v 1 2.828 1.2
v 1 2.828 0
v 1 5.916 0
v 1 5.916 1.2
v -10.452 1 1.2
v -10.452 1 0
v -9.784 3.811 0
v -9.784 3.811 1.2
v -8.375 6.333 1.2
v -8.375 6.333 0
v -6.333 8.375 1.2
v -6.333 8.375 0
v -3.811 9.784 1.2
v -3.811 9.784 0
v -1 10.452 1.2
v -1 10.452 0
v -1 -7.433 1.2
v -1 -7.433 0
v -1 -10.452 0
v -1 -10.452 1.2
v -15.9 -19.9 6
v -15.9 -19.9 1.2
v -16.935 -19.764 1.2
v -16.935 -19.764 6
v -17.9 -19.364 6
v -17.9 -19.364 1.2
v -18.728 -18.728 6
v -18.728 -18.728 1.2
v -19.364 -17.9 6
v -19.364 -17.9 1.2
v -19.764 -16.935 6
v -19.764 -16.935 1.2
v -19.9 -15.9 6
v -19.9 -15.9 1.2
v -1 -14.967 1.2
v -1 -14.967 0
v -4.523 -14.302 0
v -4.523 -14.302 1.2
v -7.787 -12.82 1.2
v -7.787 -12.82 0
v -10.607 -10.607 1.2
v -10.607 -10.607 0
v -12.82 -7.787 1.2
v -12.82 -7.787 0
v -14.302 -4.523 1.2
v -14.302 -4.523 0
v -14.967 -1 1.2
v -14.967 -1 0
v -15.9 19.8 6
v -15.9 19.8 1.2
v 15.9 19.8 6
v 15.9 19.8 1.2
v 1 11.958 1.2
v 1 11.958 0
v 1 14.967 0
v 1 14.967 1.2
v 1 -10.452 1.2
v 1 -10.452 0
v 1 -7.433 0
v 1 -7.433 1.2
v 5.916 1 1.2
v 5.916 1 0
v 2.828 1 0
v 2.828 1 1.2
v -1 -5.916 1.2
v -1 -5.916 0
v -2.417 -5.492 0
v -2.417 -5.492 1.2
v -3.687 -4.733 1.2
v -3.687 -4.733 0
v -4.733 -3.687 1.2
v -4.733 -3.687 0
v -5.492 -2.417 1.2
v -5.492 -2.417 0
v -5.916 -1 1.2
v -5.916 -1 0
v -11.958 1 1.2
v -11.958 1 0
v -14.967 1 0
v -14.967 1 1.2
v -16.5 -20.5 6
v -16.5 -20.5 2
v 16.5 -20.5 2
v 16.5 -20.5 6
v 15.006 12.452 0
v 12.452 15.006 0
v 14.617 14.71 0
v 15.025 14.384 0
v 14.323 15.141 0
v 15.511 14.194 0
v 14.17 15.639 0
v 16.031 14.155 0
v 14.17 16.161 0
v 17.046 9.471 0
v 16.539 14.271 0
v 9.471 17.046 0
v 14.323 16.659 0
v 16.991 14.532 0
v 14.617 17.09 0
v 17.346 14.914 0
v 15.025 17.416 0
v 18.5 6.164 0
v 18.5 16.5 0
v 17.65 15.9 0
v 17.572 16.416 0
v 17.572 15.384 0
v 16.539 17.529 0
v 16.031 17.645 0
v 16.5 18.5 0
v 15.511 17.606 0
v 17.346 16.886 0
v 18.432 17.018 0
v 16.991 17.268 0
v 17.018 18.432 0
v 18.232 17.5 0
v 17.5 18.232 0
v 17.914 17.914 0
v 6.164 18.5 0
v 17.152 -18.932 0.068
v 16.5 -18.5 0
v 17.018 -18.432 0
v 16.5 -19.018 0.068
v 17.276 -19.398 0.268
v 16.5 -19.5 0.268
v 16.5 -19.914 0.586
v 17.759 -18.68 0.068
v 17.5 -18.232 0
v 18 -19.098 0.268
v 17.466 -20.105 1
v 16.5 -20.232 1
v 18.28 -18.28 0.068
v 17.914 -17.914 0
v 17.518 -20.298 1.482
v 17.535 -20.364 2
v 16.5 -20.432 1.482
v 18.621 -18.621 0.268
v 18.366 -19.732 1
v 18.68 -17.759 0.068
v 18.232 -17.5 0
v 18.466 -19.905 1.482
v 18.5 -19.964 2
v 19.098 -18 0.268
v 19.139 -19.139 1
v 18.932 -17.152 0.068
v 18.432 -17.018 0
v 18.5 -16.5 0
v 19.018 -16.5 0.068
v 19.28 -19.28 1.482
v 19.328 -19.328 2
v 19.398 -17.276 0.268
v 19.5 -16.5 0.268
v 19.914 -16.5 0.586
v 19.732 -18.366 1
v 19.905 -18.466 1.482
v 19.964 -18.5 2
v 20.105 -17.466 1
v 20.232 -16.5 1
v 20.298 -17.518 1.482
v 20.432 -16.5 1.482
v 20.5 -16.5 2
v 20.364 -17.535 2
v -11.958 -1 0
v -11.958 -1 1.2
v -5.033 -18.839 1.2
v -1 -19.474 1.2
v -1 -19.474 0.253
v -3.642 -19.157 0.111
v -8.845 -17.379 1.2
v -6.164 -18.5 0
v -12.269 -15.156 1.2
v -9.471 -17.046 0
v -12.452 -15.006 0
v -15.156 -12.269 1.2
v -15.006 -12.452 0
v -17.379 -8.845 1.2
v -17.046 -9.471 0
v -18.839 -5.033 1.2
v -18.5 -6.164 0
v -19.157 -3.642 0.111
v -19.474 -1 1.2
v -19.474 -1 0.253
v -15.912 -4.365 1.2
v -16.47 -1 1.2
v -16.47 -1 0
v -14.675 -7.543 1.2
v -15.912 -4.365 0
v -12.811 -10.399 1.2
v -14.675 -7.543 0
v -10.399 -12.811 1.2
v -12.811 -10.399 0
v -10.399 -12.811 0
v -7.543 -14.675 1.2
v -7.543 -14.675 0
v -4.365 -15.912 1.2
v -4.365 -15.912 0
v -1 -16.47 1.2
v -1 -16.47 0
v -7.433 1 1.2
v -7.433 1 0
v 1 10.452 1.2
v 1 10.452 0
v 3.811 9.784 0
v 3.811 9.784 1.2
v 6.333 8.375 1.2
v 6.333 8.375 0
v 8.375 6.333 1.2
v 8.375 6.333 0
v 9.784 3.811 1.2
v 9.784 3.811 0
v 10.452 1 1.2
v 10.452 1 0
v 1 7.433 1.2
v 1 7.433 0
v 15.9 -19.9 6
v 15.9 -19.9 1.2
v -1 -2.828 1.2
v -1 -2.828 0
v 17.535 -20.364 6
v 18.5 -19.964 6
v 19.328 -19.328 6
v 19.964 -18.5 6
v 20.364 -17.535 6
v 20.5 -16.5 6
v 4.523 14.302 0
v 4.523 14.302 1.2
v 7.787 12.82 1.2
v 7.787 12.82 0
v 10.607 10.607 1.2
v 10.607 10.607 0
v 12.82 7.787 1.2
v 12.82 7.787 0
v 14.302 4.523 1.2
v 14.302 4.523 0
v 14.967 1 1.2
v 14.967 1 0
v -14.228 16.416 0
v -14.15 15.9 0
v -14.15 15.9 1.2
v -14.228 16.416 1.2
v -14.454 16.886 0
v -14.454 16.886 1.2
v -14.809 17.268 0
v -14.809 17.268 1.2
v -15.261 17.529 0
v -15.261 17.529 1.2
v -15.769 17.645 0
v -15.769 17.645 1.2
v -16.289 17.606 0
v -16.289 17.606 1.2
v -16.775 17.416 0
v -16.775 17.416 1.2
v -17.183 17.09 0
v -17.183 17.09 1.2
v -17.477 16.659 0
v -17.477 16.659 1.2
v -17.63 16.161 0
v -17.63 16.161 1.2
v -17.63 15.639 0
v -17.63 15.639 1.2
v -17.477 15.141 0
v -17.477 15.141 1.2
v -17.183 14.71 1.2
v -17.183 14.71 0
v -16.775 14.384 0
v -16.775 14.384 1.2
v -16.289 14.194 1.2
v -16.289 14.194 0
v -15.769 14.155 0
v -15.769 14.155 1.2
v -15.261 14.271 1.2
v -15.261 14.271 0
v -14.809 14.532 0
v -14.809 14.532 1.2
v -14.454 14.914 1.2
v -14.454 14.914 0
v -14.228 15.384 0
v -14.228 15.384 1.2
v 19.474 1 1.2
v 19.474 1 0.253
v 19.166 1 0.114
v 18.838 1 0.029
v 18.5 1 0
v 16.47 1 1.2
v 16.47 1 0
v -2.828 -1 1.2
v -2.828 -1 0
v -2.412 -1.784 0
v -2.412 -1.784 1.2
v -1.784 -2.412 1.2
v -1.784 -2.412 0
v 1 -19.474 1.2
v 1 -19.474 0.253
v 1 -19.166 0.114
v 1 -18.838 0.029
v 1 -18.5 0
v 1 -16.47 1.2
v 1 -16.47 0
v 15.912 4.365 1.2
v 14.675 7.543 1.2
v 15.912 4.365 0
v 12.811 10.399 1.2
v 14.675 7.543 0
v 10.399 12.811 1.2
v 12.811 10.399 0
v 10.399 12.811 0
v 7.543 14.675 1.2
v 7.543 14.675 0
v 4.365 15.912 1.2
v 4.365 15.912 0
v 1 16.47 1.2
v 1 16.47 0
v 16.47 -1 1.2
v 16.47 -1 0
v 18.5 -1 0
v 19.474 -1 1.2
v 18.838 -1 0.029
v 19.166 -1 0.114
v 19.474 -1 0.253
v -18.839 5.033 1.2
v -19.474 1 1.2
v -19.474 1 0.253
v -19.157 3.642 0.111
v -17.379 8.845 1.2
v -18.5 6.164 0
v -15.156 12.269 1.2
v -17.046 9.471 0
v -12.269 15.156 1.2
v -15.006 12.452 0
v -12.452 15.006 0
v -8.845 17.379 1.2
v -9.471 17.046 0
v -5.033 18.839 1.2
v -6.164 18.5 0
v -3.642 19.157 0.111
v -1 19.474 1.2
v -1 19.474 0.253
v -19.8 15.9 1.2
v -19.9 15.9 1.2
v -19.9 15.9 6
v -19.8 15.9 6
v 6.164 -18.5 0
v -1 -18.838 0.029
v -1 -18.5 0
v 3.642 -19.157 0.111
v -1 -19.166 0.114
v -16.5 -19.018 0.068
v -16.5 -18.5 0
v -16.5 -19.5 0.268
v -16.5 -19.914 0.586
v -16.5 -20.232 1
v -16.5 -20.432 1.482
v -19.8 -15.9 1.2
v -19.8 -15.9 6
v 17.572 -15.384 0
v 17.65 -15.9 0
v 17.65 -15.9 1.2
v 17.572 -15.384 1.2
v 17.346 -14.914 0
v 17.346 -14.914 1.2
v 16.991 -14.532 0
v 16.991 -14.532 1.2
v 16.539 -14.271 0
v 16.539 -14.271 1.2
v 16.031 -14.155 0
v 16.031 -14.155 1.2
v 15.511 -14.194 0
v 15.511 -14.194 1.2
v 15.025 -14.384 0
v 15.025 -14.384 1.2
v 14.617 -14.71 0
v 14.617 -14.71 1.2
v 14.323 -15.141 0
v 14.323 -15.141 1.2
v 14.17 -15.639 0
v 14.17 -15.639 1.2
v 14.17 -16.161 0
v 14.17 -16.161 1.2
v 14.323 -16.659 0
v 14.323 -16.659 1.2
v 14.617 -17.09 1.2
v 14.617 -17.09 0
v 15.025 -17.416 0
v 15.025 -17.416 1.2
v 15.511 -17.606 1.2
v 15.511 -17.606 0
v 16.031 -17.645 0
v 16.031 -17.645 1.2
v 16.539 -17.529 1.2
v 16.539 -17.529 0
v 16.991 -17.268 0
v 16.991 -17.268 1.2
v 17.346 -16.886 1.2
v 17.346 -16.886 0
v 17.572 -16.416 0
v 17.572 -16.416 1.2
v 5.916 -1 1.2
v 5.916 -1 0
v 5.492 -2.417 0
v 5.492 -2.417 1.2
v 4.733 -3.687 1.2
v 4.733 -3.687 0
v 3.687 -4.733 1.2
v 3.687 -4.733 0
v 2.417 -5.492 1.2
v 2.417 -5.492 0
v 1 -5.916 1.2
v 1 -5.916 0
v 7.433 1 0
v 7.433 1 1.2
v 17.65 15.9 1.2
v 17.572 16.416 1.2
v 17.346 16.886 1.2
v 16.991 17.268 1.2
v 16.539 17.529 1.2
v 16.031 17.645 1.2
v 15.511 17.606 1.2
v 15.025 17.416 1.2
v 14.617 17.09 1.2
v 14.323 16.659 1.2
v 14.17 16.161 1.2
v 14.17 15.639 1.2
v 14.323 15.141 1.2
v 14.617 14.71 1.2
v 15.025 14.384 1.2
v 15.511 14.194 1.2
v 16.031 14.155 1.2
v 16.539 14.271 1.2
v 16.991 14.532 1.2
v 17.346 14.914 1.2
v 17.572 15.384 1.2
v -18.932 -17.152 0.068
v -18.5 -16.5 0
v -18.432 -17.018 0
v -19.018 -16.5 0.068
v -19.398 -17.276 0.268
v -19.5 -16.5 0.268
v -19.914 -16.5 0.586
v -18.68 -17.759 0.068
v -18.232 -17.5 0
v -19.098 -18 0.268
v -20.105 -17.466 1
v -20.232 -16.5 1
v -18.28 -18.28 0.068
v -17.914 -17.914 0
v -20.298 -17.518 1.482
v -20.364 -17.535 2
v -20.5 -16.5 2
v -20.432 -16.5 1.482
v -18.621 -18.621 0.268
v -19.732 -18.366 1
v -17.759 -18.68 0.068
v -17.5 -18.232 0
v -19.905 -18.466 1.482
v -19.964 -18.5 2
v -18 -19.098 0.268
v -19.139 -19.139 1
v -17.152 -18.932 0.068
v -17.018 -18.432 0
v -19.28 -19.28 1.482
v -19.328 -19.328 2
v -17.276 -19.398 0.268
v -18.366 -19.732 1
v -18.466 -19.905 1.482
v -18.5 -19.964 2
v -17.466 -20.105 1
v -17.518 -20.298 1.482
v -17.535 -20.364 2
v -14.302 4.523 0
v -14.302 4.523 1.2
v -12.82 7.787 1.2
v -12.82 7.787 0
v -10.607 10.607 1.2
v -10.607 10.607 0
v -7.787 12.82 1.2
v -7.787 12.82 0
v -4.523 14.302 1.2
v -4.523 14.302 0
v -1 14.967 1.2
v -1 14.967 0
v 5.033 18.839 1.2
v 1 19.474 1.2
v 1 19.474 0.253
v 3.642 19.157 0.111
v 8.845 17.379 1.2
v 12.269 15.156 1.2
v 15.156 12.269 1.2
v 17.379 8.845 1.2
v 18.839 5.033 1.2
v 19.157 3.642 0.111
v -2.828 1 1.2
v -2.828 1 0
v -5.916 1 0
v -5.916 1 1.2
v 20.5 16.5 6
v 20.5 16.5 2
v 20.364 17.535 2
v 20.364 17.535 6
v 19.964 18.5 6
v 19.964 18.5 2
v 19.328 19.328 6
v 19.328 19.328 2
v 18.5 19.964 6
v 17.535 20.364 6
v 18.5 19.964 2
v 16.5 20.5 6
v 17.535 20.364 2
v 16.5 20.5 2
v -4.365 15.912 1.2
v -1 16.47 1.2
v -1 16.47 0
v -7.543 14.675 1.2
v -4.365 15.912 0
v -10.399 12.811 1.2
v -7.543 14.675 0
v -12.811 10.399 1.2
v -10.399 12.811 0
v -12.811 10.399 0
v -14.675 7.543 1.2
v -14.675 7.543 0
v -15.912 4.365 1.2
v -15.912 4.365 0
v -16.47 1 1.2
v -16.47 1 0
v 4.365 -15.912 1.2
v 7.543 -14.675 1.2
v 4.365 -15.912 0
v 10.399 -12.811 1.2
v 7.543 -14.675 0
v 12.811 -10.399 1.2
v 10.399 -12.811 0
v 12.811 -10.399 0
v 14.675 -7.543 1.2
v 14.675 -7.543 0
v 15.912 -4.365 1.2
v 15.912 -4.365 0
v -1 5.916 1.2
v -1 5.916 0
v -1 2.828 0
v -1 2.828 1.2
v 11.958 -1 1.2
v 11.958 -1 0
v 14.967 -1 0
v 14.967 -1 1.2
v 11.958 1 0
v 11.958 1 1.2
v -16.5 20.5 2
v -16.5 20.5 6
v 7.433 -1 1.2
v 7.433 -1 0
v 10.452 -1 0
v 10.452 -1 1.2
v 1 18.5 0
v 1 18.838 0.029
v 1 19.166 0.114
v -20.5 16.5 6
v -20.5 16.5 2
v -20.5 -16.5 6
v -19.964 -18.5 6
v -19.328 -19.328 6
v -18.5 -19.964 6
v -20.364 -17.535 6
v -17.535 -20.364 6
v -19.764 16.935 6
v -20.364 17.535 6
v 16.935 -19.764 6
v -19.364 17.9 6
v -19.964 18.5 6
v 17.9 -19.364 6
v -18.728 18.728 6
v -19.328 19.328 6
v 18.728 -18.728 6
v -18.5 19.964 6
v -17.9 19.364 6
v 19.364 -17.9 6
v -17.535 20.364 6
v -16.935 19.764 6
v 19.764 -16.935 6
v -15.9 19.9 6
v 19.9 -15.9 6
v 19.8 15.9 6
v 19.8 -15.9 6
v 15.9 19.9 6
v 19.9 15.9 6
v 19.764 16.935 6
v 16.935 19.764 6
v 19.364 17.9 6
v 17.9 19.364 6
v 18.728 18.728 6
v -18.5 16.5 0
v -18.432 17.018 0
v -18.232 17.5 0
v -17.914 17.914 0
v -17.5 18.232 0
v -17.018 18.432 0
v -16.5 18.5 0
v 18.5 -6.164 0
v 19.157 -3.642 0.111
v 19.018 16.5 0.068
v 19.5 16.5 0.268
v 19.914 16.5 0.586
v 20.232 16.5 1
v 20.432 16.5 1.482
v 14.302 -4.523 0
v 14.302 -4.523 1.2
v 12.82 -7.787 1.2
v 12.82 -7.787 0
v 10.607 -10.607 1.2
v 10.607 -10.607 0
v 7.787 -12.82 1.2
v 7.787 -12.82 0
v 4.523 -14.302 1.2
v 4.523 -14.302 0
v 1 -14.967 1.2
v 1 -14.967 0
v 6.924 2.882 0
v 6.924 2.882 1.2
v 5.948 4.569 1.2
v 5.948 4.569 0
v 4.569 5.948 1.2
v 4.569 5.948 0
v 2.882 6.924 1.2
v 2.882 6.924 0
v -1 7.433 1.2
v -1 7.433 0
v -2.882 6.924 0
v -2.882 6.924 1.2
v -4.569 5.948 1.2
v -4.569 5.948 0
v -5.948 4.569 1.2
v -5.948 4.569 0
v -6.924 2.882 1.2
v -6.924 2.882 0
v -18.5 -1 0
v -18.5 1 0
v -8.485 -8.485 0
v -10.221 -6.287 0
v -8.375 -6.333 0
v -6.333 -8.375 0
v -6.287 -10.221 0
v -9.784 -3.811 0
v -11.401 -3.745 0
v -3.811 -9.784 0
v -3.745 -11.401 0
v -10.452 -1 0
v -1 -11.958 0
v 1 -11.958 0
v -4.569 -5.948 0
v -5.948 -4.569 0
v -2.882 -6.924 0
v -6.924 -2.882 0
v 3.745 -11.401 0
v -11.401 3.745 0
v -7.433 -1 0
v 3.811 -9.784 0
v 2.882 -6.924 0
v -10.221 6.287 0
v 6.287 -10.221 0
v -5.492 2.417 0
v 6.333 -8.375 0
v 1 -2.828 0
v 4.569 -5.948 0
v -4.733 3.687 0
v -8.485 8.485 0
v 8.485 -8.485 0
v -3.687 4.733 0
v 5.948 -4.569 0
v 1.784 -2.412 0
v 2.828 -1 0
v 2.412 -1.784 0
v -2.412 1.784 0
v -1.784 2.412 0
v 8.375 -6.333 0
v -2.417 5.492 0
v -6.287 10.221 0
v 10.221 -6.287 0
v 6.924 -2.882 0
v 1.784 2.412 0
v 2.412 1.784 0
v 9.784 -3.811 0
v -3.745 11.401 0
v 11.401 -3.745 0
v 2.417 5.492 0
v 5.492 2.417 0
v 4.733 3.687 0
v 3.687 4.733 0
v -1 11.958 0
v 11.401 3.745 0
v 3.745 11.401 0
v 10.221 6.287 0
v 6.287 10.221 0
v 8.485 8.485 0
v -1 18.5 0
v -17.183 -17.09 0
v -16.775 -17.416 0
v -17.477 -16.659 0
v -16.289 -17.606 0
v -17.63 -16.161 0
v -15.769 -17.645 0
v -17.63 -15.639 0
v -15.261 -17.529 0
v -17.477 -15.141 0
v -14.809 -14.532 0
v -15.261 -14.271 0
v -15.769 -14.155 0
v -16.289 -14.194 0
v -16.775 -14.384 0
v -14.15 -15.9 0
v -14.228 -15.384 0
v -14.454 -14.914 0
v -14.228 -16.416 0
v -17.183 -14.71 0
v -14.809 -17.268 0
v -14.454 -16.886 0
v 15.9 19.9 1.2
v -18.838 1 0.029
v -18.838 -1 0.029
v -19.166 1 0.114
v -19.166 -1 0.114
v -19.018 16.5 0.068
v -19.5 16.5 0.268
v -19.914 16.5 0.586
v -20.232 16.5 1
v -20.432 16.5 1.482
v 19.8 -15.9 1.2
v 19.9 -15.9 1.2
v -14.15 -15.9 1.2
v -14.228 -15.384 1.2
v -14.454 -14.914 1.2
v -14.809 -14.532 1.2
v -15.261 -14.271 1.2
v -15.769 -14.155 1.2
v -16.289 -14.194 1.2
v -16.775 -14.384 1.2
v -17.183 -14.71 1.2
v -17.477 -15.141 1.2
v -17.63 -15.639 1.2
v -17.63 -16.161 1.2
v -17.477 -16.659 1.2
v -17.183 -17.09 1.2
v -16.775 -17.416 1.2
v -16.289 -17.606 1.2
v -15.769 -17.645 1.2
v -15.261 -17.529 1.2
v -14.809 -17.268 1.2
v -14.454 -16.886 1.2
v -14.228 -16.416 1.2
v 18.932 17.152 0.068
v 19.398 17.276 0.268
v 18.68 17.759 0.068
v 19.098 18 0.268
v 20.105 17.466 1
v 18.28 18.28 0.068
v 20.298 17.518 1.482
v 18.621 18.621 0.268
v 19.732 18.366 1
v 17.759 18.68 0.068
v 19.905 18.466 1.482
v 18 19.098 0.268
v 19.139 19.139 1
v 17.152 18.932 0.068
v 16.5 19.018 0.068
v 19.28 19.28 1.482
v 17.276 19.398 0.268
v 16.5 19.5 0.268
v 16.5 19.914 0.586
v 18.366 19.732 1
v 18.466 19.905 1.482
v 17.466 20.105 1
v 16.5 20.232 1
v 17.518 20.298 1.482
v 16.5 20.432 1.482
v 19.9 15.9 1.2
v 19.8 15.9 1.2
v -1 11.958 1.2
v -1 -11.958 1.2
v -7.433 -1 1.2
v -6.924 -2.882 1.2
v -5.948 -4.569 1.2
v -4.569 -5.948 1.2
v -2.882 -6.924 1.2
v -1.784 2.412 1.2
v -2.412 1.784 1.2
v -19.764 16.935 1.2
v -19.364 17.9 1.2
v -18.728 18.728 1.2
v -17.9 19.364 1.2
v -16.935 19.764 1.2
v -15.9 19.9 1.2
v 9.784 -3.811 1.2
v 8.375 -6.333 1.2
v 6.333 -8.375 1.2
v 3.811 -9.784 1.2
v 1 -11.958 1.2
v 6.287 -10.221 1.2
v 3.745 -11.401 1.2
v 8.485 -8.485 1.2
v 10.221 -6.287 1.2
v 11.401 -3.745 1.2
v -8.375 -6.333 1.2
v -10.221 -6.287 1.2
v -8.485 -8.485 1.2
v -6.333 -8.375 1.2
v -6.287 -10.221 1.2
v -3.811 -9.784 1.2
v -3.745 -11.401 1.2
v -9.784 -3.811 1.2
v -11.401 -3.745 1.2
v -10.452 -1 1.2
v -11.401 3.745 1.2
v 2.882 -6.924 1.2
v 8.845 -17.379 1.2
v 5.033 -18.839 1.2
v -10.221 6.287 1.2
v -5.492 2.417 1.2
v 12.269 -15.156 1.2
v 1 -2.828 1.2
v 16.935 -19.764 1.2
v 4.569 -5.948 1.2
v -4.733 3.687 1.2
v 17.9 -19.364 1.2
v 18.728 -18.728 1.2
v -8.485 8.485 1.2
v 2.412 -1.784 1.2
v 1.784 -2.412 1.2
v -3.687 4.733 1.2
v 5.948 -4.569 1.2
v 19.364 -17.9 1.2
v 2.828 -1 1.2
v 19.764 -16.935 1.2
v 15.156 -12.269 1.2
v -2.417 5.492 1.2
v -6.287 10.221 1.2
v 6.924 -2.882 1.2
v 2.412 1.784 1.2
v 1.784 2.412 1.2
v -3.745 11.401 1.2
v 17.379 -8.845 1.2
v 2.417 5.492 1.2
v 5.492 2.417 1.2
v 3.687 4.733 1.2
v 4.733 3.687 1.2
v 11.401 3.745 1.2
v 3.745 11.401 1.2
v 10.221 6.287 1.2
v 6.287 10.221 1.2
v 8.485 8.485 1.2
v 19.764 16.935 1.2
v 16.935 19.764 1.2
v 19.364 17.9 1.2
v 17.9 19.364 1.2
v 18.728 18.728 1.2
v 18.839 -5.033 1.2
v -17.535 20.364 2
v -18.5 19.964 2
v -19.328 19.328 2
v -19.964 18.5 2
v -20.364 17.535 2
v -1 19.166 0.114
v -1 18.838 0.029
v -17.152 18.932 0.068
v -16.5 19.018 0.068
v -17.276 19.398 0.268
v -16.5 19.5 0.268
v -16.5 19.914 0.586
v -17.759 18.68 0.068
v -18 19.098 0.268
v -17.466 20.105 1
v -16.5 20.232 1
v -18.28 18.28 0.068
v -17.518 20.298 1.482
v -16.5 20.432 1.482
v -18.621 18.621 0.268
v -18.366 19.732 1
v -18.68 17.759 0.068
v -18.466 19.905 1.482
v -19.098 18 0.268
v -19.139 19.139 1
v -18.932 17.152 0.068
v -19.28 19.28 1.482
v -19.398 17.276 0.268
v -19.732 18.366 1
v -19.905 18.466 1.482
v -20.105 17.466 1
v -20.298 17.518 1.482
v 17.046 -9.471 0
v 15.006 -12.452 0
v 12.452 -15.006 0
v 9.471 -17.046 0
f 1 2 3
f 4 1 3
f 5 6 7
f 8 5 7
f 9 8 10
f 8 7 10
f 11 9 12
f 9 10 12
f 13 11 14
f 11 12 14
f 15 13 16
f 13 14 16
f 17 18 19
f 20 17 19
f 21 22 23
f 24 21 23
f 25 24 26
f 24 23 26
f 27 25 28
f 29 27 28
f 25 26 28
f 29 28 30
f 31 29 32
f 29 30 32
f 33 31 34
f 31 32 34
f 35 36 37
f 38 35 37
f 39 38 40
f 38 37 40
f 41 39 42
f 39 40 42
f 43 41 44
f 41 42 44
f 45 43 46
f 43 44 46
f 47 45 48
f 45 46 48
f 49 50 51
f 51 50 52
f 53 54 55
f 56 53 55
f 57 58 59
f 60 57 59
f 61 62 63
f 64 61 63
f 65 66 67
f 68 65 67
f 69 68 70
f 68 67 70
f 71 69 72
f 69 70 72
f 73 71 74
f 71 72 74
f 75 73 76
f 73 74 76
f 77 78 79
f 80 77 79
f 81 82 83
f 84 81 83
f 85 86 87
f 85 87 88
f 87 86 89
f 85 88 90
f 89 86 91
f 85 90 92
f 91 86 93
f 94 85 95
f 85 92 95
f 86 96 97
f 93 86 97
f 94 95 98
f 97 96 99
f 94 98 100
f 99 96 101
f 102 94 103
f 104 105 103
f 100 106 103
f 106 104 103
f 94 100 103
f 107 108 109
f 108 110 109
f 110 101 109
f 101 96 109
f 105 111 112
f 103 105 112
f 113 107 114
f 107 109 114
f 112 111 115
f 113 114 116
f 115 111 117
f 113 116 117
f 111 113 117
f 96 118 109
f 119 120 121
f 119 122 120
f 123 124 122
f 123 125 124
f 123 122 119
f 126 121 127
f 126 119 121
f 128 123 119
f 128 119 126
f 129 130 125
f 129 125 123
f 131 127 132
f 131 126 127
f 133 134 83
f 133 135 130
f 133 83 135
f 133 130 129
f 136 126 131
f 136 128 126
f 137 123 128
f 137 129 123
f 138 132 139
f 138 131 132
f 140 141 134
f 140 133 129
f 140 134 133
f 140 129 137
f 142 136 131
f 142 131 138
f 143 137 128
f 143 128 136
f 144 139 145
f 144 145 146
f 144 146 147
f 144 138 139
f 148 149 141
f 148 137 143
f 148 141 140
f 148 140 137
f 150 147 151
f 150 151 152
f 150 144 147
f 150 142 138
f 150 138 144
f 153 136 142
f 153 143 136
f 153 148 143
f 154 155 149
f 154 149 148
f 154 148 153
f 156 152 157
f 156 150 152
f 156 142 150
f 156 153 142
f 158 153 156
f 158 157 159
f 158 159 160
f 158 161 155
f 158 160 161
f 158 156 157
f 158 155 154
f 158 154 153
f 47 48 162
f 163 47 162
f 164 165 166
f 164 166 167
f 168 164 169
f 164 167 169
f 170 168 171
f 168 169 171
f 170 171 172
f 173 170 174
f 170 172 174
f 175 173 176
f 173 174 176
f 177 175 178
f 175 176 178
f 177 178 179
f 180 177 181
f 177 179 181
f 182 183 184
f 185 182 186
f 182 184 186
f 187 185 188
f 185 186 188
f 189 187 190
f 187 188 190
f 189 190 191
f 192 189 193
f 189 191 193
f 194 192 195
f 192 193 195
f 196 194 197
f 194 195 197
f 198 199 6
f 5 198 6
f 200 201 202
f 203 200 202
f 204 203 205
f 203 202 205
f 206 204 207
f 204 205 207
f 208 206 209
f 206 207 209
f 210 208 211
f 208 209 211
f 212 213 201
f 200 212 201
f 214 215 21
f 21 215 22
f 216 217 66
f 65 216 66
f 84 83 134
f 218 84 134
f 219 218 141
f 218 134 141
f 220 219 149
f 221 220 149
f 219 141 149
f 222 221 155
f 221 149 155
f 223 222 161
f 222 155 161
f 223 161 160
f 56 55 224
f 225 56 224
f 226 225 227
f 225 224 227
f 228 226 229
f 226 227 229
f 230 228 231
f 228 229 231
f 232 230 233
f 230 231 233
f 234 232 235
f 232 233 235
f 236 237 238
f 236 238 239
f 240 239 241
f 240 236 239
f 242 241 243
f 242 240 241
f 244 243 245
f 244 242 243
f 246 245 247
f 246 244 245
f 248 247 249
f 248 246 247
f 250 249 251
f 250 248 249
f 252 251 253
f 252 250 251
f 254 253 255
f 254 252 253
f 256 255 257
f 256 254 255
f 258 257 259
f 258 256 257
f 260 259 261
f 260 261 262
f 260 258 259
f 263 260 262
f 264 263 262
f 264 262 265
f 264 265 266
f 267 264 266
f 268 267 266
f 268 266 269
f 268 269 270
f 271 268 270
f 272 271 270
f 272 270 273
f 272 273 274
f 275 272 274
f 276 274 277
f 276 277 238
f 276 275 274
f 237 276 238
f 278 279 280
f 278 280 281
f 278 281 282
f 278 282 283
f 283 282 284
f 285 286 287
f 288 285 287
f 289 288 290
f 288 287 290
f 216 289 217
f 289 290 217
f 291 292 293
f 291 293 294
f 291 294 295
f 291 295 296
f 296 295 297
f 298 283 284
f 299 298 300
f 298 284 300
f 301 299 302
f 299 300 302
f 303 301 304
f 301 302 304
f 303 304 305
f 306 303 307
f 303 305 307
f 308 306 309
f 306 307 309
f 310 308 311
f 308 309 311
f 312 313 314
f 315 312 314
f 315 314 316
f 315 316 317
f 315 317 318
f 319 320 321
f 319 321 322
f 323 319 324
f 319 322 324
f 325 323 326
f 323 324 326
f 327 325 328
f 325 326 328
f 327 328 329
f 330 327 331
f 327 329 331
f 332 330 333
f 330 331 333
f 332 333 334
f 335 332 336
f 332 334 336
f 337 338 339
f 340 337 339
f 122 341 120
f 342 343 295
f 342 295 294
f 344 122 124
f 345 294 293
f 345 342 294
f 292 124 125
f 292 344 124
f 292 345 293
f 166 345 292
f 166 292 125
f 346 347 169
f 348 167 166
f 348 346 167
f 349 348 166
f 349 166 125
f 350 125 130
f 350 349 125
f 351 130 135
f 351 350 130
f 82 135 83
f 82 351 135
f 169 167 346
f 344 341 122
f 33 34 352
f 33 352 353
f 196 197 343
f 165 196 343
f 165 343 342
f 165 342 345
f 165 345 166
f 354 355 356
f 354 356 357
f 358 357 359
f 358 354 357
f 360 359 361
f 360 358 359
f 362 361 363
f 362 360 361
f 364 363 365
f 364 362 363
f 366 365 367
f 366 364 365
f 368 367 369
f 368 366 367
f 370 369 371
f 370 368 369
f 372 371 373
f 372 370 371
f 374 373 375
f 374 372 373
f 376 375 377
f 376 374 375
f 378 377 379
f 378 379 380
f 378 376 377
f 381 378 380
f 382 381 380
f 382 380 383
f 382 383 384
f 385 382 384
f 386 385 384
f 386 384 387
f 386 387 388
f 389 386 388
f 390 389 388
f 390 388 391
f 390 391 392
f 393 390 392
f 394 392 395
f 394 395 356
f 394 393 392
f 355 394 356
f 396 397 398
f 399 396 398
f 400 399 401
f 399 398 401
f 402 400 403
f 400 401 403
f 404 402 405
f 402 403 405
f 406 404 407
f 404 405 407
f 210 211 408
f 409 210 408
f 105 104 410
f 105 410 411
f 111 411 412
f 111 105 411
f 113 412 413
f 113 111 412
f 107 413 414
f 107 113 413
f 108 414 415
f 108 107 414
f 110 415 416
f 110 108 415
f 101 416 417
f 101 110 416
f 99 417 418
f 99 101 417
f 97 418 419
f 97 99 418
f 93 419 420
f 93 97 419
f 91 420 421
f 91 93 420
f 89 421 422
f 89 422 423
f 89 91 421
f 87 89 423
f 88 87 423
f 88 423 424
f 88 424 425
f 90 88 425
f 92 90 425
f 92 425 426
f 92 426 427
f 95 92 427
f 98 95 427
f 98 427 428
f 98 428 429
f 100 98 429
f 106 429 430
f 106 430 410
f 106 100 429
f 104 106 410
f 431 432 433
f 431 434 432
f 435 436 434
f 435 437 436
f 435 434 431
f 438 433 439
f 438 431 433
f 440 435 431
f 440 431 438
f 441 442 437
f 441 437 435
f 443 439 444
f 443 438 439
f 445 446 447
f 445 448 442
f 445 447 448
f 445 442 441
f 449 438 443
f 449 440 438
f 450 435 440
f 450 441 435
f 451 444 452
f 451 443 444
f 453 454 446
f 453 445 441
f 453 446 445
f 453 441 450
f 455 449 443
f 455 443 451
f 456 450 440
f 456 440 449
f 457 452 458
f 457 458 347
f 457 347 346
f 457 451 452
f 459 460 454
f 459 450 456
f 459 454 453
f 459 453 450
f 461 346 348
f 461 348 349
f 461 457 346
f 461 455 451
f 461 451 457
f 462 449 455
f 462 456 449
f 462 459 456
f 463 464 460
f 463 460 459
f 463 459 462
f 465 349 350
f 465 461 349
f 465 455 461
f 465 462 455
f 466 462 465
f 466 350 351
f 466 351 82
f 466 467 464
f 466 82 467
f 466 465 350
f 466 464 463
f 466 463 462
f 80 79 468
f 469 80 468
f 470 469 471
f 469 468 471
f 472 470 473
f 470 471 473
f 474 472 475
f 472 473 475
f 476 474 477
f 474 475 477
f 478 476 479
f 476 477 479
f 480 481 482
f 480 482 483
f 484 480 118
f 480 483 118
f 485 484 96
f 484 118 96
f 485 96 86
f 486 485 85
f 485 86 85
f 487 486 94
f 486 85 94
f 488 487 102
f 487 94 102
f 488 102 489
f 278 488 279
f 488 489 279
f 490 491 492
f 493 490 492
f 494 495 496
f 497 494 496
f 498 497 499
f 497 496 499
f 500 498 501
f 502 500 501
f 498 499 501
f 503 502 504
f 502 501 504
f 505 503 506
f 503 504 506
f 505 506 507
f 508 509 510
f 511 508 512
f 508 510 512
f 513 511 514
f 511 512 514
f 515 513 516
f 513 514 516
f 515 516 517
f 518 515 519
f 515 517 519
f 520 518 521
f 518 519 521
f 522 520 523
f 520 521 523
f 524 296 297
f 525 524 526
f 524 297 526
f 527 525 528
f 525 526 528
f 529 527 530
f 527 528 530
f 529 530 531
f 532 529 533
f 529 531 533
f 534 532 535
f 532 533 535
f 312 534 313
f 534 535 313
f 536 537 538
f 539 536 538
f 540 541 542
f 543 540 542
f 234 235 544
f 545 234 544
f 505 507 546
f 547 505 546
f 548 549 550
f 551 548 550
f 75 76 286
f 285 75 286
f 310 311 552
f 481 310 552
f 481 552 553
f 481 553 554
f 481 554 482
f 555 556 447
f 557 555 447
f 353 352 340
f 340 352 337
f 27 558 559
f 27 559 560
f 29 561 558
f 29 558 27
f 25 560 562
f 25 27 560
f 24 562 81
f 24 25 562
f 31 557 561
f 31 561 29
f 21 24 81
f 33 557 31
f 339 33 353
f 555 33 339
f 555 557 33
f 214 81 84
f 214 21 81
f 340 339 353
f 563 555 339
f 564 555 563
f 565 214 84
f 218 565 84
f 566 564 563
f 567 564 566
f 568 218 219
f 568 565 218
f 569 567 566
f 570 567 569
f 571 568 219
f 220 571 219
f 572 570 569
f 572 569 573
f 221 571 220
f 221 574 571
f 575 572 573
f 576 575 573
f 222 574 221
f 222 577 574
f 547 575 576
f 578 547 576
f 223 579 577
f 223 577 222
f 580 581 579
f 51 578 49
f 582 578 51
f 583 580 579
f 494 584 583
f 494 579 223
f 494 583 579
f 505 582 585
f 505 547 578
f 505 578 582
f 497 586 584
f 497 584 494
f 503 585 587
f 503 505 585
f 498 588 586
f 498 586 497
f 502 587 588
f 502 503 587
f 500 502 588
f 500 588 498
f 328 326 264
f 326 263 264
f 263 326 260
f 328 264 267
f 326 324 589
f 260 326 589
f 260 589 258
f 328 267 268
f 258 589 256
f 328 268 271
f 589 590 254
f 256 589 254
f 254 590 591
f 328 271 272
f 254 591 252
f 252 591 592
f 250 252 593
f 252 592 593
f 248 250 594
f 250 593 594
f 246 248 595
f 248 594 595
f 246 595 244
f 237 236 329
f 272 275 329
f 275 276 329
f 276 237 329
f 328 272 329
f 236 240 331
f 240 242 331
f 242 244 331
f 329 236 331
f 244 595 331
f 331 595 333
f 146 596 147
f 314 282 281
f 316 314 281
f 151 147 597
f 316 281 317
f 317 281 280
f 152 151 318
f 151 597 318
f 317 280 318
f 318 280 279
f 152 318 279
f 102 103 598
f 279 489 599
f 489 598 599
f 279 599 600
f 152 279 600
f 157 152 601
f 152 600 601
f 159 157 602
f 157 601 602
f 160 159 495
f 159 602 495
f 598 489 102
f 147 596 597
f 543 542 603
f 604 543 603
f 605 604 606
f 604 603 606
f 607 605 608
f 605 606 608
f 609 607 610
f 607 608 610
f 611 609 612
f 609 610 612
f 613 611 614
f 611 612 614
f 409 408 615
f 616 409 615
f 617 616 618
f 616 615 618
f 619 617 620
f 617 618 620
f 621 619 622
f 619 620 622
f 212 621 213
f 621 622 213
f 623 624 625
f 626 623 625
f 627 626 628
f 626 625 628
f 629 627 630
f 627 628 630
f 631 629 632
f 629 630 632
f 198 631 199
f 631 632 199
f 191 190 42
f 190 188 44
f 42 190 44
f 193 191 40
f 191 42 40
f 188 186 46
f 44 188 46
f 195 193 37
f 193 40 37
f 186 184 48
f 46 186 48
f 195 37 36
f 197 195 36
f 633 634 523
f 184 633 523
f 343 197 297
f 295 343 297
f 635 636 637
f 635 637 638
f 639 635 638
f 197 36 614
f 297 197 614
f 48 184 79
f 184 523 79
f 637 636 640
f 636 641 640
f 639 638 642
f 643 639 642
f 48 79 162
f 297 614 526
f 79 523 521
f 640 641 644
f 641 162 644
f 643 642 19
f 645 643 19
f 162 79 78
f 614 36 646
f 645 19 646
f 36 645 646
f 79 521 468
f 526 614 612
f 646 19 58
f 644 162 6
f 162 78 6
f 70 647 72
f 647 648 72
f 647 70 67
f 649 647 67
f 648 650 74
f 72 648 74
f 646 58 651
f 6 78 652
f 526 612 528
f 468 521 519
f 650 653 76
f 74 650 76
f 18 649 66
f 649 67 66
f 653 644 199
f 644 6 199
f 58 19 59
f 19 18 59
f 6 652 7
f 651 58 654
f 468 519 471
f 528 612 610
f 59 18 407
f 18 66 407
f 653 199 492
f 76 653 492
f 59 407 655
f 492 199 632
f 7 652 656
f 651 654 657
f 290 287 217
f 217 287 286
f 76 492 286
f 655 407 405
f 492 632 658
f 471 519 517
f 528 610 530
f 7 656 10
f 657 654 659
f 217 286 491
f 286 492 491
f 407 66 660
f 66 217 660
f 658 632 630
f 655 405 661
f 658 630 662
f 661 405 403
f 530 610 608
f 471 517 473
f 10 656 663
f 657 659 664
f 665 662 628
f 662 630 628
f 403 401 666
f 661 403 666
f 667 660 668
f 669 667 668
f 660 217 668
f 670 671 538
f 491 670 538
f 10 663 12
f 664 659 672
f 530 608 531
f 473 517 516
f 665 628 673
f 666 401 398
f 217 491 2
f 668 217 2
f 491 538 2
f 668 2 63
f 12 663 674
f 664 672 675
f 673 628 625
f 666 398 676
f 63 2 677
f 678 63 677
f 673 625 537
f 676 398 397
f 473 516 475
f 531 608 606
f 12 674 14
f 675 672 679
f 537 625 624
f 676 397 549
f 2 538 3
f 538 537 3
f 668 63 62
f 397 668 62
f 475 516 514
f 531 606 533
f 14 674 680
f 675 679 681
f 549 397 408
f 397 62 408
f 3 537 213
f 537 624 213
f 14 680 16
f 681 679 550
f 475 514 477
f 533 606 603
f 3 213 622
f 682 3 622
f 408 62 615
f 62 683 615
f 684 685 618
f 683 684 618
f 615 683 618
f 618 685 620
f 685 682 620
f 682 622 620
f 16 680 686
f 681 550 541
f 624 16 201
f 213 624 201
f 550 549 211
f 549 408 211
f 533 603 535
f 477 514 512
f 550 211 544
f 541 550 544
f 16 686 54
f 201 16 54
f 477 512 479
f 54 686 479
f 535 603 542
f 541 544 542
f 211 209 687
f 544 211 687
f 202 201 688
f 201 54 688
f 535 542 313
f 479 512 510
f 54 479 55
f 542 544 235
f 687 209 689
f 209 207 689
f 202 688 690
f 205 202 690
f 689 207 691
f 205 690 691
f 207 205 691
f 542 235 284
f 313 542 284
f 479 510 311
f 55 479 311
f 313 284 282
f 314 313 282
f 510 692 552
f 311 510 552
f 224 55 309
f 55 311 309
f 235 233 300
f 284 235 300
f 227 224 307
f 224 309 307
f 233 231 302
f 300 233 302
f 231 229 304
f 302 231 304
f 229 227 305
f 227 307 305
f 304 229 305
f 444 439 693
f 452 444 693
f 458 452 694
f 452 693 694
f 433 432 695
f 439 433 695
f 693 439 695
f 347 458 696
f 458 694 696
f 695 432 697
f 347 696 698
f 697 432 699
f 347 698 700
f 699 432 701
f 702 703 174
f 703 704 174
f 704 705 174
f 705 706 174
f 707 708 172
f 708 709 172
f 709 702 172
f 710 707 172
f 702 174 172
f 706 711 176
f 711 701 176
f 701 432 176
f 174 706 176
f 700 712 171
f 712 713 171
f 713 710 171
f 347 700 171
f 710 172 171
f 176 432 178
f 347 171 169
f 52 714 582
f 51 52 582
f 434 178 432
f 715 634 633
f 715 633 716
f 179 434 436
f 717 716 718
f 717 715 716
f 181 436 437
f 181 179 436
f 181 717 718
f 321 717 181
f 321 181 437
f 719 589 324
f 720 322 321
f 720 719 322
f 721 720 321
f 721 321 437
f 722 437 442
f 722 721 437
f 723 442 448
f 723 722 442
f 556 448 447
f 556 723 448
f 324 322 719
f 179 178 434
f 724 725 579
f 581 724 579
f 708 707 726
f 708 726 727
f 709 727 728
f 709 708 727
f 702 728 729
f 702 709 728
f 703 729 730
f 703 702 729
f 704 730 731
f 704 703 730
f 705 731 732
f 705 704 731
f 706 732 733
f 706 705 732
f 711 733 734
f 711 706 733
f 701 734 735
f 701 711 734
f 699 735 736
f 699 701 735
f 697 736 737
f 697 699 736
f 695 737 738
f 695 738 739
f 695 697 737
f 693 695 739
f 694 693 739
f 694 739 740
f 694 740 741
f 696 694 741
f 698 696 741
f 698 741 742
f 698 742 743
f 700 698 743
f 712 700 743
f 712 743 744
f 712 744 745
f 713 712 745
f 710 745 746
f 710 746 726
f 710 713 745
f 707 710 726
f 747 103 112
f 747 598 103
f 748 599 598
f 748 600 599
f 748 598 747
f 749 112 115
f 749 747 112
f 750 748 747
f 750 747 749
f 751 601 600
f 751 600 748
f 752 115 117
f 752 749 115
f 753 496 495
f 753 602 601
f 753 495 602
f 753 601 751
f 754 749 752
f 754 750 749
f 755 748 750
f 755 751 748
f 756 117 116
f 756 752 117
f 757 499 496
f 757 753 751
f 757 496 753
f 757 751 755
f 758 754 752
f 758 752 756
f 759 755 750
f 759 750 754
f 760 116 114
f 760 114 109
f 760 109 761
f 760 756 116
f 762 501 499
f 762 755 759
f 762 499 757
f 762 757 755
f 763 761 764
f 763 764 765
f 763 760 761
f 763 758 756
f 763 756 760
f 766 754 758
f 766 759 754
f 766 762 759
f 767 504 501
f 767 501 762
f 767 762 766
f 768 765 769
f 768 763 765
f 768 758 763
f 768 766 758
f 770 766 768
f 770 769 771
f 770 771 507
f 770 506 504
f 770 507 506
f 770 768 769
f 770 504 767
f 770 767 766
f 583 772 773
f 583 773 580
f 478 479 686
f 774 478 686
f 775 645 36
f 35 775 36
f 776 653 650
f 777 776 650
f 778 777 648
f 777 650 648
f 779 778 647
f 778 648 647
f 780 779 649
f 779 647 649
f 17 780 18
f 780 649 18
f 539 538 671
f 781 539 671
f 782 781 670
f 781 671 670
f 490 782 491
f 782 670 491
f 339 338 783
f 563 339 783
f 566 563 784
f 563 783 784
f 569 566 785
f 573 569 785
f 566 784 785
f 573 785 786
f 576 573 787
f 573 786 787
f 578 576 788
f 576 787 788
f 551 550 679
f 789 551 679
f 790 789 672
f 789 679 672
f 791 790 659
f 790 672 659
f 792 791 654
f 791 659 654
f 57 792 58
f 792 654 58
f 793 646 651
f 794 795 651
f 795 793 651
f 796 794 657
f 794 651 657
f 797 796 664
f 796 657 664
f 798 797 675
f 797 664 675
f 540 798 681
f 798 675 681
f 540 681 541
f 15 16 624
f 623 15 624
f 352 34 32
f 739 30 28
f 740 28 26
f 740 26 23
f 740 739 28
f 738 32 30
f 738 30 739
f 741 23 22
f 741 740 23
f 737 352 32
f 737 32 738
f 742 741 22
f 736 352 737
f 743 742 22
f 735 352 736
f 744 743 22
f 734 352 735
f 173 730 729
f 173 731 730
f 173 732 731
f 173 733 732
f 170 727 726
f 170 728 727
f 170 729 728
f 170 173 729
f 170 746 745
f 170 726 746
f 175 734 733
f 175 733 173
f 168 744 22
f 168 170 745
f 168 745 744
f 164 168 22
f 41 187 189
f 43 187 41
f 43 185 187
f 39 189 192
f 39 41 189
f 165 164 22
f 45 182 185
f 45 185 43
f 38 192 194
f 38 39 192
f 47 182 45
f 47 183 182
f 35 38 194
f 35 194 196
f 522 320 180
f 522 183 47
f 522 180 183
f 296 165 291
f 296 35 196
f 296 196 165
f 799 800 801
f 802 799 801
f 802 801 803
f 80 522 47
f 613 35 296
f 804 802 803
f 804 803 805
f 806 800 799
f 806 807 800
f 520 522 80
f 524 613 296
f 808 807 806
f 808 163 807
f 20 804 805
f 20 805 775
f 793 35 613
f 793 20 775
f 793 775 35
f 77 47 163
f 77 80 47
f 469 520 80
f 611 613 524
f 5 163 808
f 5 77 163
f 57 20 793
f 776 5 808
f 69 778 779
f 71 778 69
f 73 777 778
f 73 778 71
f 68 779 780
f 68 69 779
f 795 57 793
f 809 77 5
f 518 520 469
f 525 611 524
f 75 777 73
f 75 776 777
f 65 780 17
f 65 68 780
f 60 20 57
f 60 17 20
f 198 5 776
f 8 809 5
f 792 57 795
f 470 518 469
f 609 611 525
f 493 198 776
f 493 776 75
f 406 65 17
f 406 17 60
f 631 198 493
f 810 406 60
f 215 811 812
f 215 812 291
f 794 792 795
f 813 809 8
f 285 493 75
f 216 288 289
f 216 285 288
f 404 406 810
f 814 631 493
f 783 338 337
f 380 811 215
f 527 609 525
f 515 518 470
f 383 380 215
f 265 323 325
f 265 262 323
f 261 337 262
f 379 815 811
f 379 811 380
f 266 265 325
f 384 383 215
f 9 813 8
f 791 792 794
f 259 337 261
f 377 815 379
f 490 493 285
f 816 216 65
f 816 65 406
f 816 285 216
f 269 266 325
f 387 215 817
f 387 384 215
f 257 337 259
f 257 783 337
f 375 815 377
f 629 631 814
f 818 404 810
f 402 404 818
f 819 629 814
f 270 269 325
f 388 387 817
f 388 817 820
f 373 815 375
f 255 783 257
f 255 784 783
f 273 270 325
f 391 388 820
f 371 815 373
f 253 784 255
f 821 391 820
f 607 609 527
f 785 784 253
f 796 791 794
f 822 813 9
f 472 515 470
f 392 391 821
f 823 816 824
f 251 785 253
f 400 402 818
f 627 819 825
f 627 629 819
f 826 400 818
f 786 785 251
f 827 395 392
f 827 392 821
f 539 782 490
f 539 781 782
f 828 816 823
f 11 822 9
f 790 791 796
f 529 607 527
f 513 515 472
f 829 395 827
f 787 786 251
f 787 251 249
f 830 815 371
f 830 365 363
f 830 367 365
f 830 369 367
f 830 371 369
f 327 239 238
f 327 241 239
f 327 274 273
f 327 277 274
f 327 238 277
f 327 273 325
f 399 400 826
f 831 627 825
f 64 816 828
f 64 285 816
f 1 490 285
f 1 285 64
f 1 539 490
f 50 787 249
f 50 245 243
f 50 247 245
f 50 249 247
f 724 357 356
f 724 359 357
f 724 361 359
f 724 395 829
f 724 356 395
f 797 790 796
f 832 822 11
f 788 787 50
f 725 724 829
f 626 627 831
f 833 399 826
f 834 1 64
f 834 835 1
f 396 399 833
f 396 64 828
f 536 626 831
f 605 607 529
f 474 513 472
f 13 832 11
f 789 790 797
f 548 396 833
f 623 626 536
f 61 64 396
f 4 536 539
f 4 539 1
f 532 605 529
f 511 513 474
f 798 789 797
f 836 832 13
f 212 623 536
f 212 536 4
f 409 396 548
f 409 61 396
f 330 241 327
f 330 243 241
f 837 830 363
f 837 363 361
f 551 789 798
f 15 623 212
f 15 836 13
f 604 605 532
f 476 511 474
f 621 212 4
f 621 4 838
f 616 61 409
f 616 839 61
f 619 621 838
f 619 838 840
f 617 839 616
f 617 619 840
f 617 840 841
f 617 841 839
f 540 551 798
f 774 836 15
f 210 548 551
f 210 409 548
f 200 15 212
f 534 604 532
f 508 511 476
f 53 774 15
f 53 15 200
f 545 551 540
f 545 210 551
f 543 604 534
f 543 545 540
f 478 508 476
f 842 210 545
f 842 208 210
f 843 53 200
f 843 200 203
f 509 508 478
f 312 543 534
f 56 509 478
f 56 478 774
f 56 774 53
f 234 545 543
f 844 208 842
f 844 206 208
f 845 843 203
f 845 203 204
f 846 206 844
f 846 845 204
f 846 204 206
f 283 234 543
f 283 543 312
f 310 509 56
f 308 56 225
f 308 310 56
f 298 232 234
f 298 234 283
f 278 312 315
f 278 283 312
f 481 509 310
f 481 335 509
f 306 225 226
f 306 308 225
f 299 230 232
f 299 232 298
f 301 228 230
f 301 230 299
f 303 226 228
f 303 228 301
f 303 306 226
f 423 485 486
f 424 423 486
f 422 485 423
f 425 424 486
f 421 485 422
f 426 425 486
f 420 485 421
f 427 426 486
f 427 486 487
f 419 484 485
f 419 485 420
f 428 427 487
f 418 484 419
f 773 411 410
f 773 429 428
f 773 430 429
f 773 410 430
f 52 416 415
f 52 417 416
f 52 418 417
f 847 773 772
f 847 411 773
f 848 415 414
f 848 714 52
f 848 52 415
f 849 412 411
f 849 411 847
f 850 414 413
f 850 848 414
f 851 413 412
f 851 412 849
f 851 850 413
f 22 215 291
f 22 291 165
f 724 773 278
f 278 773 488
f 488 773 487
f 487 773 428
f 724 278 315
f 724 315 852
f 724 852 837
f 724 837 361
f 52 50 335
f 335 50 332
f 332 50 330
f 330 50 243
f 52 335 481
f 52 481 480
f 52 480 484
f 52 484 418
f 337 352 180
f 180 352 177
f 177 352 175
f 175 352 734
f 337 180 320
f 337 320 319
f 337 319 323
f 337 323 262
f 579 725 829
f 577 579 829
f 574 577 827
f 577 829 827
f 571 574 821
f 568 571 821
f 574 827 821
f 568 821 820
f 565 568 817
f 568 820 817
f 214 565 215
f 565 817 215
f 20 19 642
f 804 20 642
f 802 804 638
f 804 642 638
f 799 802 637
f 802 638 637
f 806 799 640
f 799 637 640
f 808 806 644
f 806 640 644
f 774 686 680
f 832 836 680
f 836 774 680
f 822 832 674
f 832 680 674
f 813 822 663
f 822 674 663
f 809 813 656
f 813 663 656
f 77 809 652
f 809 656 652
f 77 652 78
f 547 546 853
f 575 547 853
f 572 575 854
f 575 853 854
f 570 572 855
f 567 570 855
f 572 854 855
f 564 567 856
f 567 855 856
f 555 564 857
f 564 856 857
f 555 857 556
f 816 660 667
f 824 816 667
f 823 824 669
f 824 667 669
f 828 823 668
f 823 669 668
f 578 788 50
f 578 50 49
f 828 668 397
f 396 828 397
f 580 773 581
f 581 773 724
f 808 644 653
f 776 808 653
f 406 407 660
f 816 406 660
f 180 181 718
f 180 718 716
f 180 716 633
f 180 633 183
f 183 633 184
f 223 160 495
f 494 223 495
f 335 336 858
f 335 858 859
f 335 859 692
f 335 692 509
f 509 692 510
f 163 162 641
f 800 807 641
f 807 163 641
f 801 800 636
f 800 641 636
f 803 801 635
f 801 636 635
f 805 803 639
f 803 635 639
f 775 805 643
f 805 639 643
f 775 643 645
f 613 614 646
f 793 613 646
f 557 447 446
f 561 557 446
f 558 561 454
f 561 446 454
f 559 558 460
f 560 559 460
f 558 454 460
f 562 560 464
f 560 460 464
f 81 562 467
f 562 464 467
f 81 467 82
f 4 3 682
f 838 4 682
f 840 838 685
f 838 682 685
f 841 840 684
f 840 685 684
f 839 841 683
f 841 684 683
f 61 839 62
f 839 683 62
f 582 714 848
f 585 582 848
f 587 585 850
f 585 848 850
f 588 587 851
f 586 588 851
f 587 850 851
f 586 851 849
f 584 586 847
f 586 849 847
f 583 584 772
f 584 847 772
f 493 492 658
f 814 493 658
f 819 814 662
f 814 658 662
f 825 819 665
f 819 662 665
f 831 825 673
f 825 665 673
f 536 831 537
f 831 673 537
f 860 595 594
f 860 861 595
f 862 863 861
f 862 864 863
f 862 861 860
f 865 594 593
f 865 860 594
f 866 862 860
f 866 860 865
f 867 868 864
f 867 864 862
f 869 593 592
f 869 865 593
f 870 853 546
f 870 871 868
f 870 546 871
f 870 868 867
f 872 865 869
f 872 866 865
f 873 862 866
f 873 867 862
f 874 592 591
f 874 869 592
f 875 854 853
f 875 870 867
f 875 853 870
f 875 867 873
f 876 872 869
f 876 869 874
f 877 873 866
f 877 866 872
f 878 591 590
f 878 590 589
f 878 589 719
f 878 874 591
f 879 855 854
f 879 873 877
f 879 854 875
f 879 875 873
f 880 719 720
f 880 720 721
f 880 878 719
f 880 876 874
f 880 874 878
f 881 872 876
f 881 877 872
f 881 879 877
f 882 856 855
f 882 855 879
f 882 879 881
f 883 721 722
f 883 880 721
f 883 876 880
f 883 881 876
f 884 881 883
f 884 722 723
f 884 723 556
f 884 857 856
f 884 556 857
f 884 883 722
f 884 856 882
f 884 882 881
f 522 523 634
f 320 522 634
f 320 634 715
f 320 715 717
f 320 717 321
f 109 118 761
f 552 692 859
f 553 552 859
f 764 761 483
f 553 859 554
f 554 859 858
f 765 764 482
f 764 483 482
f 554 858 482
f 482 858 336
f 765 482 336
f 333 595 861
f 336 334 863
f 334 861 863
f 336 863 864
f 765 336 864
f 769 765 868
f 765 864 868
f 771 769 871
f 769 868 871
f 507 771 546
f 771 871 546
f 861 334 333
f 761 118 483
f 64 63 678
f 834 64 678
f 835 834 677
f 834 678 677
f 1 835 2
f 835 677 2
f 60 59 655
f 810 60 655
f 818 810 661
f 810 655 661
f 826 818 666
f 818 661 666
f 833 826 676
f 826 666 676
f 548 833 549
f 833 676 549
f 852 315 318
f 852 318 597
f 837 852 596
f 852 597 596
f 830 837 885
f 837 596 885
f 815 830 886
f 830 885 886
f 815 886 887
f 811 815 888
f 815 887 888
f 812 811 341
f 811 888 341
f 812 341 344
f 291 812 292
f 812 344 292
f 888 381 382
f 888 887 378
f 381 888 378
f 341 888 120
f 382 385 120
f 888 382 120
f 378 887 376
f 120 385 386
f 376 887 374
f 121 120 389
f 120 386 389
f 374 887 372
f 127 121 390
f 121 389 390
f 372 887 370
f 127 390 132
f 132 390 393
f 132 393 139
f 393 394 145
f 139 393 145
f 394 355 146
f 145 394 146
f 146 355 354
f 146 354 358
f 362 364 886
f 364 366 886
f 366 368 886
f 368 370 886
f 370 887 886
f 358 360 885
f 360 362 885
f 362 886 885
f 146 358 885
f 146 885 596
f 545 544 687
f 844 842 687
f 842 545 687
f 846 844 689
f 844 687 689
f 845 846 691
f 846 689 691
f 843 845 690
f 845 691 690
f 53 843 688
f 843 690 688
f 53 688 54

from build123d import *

# Parameters (mm, degrees)
F0_R         = 1.75
F1_DEPTH     = 1.2
F2_DEPTH     = 6
F4_DEPTH     = 10
F5_T1_DEPTH  = 33
F5_T3_DEPTH  = 33
F5_T6_ANGLE  = 90
F5_T8_ANGLE  = 90
F5_T10_ANGLE = 90
F5_T12_ANGLE = 90
F6_DEPTH     = 0.1
F7_DEPTH     = 0.1
F8_DEPTH     = 0.1


# Not quite as in the source:
# - a fillet or chamfer that OpenCascade refuses, or shapes differently, is made with other operations: its cross-section is extruded or revolved along the edge and cut away or added


with BuildPart() as f1:
    # F0 (on Top) → F1 (new body)
    with BuildSketch(Plane.XY):
        with BuildLine():
            Line((-15.9, -19.9), (15.9, -19.9))
            ThreePointArc((15.9, -19.9), (18.7284271247, -18.7284271247), (19.9, -15.9))
            Line((19.9, -15.9), (19.9, 15.9))
            ThreePointArc((19.9, 15.9), (18.7284271247, 18.7284271247), (15.9, 19.9))
            Line((15.9, 19.9), (-15.9, 19.9))
            ThreePointArc((-15.9, 19.9), (-18.7284271247, 18.7284271247), (-19.9, 15.9))
            Line((-19.9, 15.9), (-19.9, -15.9))
            ThreePointArc((-19.9, -15.9), (-18.7284271247, -18.7284271247), (-15.9, -19.9))
        make_face()
        with Locations((-15.9, -15.9)):
            Circle(F0_R, mode=Mode.SUBTRACT)
        with Locations((15.9, -15.9)):
            Circle(F0_R, mode=Mode.SUBTRACT)
        with Locations((-15.9, 15.9)):
            Circle(F0_R, mode=Mode.SUBTRACT)
        with Locations((15.9, 15.9)):
            Circle(F0_R, mode=Mode.SUBTRACT)
    extrude(amount=F1_DEPTH)

    # F0 (on Top) → F2 (join)
    with BuildSketch(Plane.XY):
        with BuildLine():
            Line((-16.5, -20.5), (16.5, -20.5))
            ThreePointArc((16.5, -20.5), (19.3284271247, -19.3284271247), (20.5, -16.5))
            Line((20.5, -16.5), (20.5, 16.5))
            ThreePointArc((20.5, 16.5), (19.3284271247, 19.3284271247), (16.5, 20.5))
            Line((16.5, 20.5), (-16.5, 20.5))
            ThreePointArc((-16.5, 20.5), (-19.3284271247, 19.3284271247), (-20.5, 16.5))
            Line((-20.5, 16.5), (-20.5, -16.5))
            ThreePointArc((-20.5, -16.5), (-19.3284271247, -19.3284271247), (-16.5, -20.5))
        make_face()
        with BuildLine():
            ThreePointArc((19.9, -15.9), (18.7284271247, -18.7284271247), (15.9, -19.9))
            Line((15.9, -19.9), (-15.9, -19.9))
            ThreePointArc((-15.9, -19.9), (-18.7284271247, -18.7284271247), (-19.9, -15.9))
            Line((-19.9, -15.9), (-19.9, 15.9))
            ThreePointArc((-19.9, 15.9), (-18.7284271247, 18.7284271247), (-15.9, 19.9))
            Line((-15.9, 19.9), (15.9, 19.9))
            ThreePointArc((15.9, 19.9), (18.7284271247, 18.7284271247), (19.9, 15.9))
            Line((19.9, 15.9), (19.9, -15.9))
        make_face(mode=Mode.SUBTRACT)
    extrude(amount=F2_DEPTH)

    # F3 (on face) → F4 (cut)
    with BuildSketch(Plane(origin=(0, 0, 0), x_dir=(1, 0, 0), z_dir=(0, 0, -1))):
        with BuildLine():
            ThreePointArc((1, 2.8284271247), (2.1213203436, 2.1213203436), (2.8284271247, 1))
            Line((2.8284271247, 1), (5.9160797831, 1))
            ThreePointArc((5.9160797831, 1), (4.2426406871, 4.2426406871), (1, 5.9160797831))
            Line((1, 5.9160797831), (1, 2.8284271247))
        make_face()
        with BuildLine():
            Line((5.9160797831, -1), (2.8284271247, -1))
            ThreePointArc((2.8284271247, -1), (2.1213203436, -2.1213203436), (1, -2.8284271247))
            Line((1, -2.8284271247), (1, -5.9160797831))
            ThreePointArc((1, -5.9160797831), (4.2426406871, -4.2426406871), (5.9160797831, -1))
        make_face()
        with BuildLine():
            ThreePointArc((-2.8284271247, 1), (-2.1213203436, 2.1213203436), (-1, 2.8284271247))
            Line((-1, 2.8284271247), (-1, 5.9160797831))
            ThreePointArc((-1, 5.9160797831), (-4.2426406871, 4.2426406871), (-5.9160797831, 1))
            Line((-5.9160797831, 1), (-2.8284271247, 1))
        make_face()
        with BuildLine():
            ThreePointArc((1, 7.4330343737), (5.3033008589, 5.3033008589), (7.4330343737, 1))
            Line((7.4330343737, 1), (10.4522724802, 1))
            ThreePointArc((10.4522724802, 1), (7.4246212025, 7.4246212025), (1, 10.4522724802))
            Line((1, 10.4522724802), (1, 7.4330343737))
        make_face()
        with BuildLine():
            Line((-1, -5.9160797831), (-1, -2.8284271247))
            ThreePointArc((-1, -2.8284271247), (-2.1213203436, -2.1213203436), (-2.8284271247, -1))
            Line((-2.8284271247, -1), (-5.9160797831, -1))
            ThreePointArc((-5.9160797831, -1), (-4.2426406871, -4.2426406871), (-1, -5.9160797831))
        make_face()
        with BuildLine():
            Line((10.4522724802, -1), (7.4330343737, -1))
            ThreePointArc((7.4330343737, -1), (5.3033008589, -5.3033008589), (1, -7.4330343737))
            Line((1, -7.4330343737), (1, -10.4522724802))
            ThreePointArc((1, -10.4522724802), (7.4246212025, -7.4246212025), (10.4522724802, -1))
        make_face()
        with BuildLine():
            ThreePointArc((-7.4330343737, 1), (-5.3033008589, 5.3033008589), (-1, 7.4330343737))
            Line((-1, 7.4330343737), (-1, 10.4522724802))
            ThreePointArc((-1, 10.4522724802), (-7.4246212025, 7.4246212025), (-10.4522724802, 1))
            Line((-10.4522724802, 1), (-7.4330343737, 1))
        make_face()
        with BuildLine():
            ThreePointArc((1, 11.9582607431), (8.4852813742, 8.4852813742), (11.9582607431, 1))
            Line((11.9582607431, 1), (14.9666295471, 1))
            ThreePointArc((14.9666295471, 1), (10.6066017178, 10.6066017178), (1, 14.9666295471))
            Line((1, 14.9666295471), (1, 11.9582607431))
        make_face()
        with BuildLine():
            Line((-1, -10.4522724802), (-1, -7.4330343737))
            ThreePointArc((-1, -7.4330343737), (-5.3033008589, -5.3033008589), (-7.4330343737, -1))
            Line((-7.4330343737, -1), (-10.4522724802, -1))
            ThreePointArc((-10.4522724802, -1), (-7.4246212025, -7.4246212025), (-1, -10.4522724802))
        make_face()
        with BuildLine():
            Line((14.9666295471, -1), (11.9582607431, -1))
            ThreePointArc((11.9582607431, -1), (8.4852813742, -8.4852813742), (1, -11.9582607431))
            Line((1, -11.9582607431), (1, -14.9666295471))
            ThreePointArc((1, -14.9666295471), (10.6066017178, -10.6066017178), (14.9666295471, -1))
        make_face()
        with BuildLine():
            ThreePointArc((-11.9582607431, 1), (-8.4852813742, 8.4852813742), (-1, 11.9582607431))
            Line((-1, 11.9582607431), (-1, 14.9666295471))
            ThreePointArc((-1, 14.9666295471), (-10.6066017178, 10.6066017178), (-14.9666295471, 1))
            Line((-14.9666295471, 1), (-11.9582607431, 1))
        make_face()
        with BuildLine():
            ThreePointArc((1, 16.469669092), (11.6672618896, 11.6672618896), (16.469669092, 1))
            Line((16.469669092, 1), (19.4743420942, 1))
            ThreePointArc((19.4743420942, 1), (13.7885822331, 13.7885822331), (1, 19.4743420942))
            Line((1, 19.4743420942), (1, 16.469669092))
        make_face()
        with BuildLine():
            Line((-1, -14.9666295471), (-1, -11.9582607431))
            ThreePointArc((-1, -11.9582607431), (-8.4852813742, -8.4852813742), (-11.9582607431, -1))
            Line((-11.9582607431, -1), (-14.9666295471, -1))
            ThreePointArc((-14.9666295471, -1), (-10.6066017178, -10.6066017178), (-1, -14.9666295471))
        make_face()
        with BuildLine():
            Line((19.4743420942, -1), (16.469669092, -1))
            ThreePointArc((16.469669092, -1), (11.6672618896, -11.6672618896), (1, -16.469669092))
            Line((1, -16.469669092), (1, -19.4743420942))
            ThreePointArc((1, -19.4743420942), (13.7885822331, -13.7885822331), (19.4743420942, -1))
        make_face()
        with BuildLine():
            ThreePointArc((-16.469669092, 1), (-11.6672618896, 11.6672618896), (-1, 16.469669092))
            Line((-1, 16.469669092), (-1, 19.4743420942))
            ThreePointArc((-1, 19.4743420942), (-13.7885822331, 13.7885822331), (-19.4743420942, 1))
            Line((-19.4743420942, 1), (-16.469669092, 1))
        make_face()
        with BuildLine():
            Line((-1, -19.4743420942), (-1, -16.469669092))
            ThreePointArc((-1, -16.469669092), (-11.6672618896, -11.6672618896), (-16.469669092, -1))
            Line((-16.469669092, -1), (-19.4743420942, -1))
            ThreePointArc((-19.4743420942, -1), (-13.7885822331, -13.7885822331), (-1, -19.4743420942))
        make_face()
    extrude(amount=-F4_DEPTH, mode=Mode.SUBTRACT)

    # F5: fillet of radius 2 on 8 edges, made by hand

    # F5_s2 → F5_t1 (cut)
    with BuildSketch(Plane.YZ.offset(-16.5)):
        with BuildLine():
            ThreePointArc((-18.5, 0), (-19.9142135624, 0.5857864376), (-20.5, 2))
            Line((-20.5, 2), (-20.5, 0))
            Line((-20.5, 0), (-18.5, 0))
        make_face()
        with BuildLine():
            ThreePointArc((18.5, 0), (19.9142135624, 0.5857864376), (20.5, 2))
            Line((20.5, 2), (20.5, 0))
            Line((20.5, 0), (18.5, 0))
        make_face()
    extrude(amount=F5_T1_DEPTH, mode=Mode.SUBTRACT)

    # F5_s4 → F5_t3 (cut)
    with BuildSketch(Plane.XZ.offset(-16.5)):
        with BuildLine():
            ThreePointArc((-18.5, 0), (-19.9142135624, 0.5857864376), (-20.5, 2))
            Line((-20.5, 2), (-20.5, 0))
            Line((-20.5, 0), (-18.5, 0))
        make_face()
        with BuildLine():
            ThreePointArc((18.5, 0), (19.9142135624, 0.5857864376), (20.5, 2))
            Line((20.5, 2), (20.5, 0))
            Line((20.5, 0), (18.5, 0))
        make_face()
    extrude(amount=F5_T3_DEPTH, mode=Mode.SUBTRACT)

    # F5_s5 → F5_t6 (revolve, cut)
    with BuildSketch(Plane.XZ.offset(16.5)):
        with BuildLine():
            ThreePointArc((-18.5, 0), (-19.9142135624, 0.5857864376), (-20.5, 2))
            Line((-20.5, 2), (-20.5, 0))
            Line((-20.5, 0), (-18.5, 0))
        make_face()
    revolve(axis=Axis((-16.5, -16.5, 0), (0, 0, 1)), revolution_arc=F5_T6_ANGLE, mode=Mode.SUBTRACT)

    # F5_s7 → F5_t8 (revolve, cut)
    with BuildSketch(Plane.YZ.offset(16.5)):
        with BuildLine():
            ThreePointArc((-18.5, 0), (-19.9142135624, 0.5857864376), (-20.5, 2))
            Line((-20.5, 2), (-20.5, 0))
            Line((-20.5, 0), (-18.5, 0))
        make_face()
    revolve(axis=Axis((16.5, -16.5, 0), (0, 0, 1)), revolution_arc=F5_T8_ANGLE, mode=Mode.SUBTRACT)

    # F5_s9 → F5_t10 (revolve, cut)
    with BuildSketch(Plane.XZ.offset(-16.5)):
        with BuildLine():
            ThreePointArc((18.5, 0), (19.9142135624, 0.5857864376), (20.5, 2))
            Line((20.5, 2), (20.5, 0))
            Line((20.5, 0), (18.5, 0))
        make_face()
    revolve(axis=Axis((16.5, 16.5, 0), (0, 0, 1)), revolution_arc=F5_T10_ANGLE, mode=Mode.SUBTRACT)

    # F5_s11 → F5_t12 (revolve, cut)
    with BuildSketch(Plane.YZ.offset(-16.5)):
        with BuildLine():
            ThreePointArc((18.5, 0), (19.9142135624, 0.5857864376), (20.5, 2))
            Line((20.5, 2), (20.5, 0))
            Line((20.5, 0), (18.5, 0))
        make_face()
    revolve(axis=Axis((-16.5, 16.5, 0), (0, 0, 1)), revolution_arc=F5_T12_ANGLE, mode=Mode.SUBTRACT)

    # F6 (add): a face of the model
    f6_faces = [f1.faces().sort_by_distance(p)[0] for p in [
        (19.9, 0, 3.6),
    ]]
    extrude(f6_faces, amount=F6_DEPTH)

    # F7 (add): a face of the model
    f7_faces = [f1.faces().sort_by_distance(p)[0] for p in [
        (-19.9, 0, 3.6),
    ]]
    extrude(f7_faces, amount=F7_DEPTH)

    # F8 (add): a face of the model
    f8_faces = [f1.faces().sort_by_distance(p)[0] for p in [
        (0, 19.9, 3.6),
    ]]
    extrude(f8_faces, amount=F8_DEPTH)


solid = f1.part
